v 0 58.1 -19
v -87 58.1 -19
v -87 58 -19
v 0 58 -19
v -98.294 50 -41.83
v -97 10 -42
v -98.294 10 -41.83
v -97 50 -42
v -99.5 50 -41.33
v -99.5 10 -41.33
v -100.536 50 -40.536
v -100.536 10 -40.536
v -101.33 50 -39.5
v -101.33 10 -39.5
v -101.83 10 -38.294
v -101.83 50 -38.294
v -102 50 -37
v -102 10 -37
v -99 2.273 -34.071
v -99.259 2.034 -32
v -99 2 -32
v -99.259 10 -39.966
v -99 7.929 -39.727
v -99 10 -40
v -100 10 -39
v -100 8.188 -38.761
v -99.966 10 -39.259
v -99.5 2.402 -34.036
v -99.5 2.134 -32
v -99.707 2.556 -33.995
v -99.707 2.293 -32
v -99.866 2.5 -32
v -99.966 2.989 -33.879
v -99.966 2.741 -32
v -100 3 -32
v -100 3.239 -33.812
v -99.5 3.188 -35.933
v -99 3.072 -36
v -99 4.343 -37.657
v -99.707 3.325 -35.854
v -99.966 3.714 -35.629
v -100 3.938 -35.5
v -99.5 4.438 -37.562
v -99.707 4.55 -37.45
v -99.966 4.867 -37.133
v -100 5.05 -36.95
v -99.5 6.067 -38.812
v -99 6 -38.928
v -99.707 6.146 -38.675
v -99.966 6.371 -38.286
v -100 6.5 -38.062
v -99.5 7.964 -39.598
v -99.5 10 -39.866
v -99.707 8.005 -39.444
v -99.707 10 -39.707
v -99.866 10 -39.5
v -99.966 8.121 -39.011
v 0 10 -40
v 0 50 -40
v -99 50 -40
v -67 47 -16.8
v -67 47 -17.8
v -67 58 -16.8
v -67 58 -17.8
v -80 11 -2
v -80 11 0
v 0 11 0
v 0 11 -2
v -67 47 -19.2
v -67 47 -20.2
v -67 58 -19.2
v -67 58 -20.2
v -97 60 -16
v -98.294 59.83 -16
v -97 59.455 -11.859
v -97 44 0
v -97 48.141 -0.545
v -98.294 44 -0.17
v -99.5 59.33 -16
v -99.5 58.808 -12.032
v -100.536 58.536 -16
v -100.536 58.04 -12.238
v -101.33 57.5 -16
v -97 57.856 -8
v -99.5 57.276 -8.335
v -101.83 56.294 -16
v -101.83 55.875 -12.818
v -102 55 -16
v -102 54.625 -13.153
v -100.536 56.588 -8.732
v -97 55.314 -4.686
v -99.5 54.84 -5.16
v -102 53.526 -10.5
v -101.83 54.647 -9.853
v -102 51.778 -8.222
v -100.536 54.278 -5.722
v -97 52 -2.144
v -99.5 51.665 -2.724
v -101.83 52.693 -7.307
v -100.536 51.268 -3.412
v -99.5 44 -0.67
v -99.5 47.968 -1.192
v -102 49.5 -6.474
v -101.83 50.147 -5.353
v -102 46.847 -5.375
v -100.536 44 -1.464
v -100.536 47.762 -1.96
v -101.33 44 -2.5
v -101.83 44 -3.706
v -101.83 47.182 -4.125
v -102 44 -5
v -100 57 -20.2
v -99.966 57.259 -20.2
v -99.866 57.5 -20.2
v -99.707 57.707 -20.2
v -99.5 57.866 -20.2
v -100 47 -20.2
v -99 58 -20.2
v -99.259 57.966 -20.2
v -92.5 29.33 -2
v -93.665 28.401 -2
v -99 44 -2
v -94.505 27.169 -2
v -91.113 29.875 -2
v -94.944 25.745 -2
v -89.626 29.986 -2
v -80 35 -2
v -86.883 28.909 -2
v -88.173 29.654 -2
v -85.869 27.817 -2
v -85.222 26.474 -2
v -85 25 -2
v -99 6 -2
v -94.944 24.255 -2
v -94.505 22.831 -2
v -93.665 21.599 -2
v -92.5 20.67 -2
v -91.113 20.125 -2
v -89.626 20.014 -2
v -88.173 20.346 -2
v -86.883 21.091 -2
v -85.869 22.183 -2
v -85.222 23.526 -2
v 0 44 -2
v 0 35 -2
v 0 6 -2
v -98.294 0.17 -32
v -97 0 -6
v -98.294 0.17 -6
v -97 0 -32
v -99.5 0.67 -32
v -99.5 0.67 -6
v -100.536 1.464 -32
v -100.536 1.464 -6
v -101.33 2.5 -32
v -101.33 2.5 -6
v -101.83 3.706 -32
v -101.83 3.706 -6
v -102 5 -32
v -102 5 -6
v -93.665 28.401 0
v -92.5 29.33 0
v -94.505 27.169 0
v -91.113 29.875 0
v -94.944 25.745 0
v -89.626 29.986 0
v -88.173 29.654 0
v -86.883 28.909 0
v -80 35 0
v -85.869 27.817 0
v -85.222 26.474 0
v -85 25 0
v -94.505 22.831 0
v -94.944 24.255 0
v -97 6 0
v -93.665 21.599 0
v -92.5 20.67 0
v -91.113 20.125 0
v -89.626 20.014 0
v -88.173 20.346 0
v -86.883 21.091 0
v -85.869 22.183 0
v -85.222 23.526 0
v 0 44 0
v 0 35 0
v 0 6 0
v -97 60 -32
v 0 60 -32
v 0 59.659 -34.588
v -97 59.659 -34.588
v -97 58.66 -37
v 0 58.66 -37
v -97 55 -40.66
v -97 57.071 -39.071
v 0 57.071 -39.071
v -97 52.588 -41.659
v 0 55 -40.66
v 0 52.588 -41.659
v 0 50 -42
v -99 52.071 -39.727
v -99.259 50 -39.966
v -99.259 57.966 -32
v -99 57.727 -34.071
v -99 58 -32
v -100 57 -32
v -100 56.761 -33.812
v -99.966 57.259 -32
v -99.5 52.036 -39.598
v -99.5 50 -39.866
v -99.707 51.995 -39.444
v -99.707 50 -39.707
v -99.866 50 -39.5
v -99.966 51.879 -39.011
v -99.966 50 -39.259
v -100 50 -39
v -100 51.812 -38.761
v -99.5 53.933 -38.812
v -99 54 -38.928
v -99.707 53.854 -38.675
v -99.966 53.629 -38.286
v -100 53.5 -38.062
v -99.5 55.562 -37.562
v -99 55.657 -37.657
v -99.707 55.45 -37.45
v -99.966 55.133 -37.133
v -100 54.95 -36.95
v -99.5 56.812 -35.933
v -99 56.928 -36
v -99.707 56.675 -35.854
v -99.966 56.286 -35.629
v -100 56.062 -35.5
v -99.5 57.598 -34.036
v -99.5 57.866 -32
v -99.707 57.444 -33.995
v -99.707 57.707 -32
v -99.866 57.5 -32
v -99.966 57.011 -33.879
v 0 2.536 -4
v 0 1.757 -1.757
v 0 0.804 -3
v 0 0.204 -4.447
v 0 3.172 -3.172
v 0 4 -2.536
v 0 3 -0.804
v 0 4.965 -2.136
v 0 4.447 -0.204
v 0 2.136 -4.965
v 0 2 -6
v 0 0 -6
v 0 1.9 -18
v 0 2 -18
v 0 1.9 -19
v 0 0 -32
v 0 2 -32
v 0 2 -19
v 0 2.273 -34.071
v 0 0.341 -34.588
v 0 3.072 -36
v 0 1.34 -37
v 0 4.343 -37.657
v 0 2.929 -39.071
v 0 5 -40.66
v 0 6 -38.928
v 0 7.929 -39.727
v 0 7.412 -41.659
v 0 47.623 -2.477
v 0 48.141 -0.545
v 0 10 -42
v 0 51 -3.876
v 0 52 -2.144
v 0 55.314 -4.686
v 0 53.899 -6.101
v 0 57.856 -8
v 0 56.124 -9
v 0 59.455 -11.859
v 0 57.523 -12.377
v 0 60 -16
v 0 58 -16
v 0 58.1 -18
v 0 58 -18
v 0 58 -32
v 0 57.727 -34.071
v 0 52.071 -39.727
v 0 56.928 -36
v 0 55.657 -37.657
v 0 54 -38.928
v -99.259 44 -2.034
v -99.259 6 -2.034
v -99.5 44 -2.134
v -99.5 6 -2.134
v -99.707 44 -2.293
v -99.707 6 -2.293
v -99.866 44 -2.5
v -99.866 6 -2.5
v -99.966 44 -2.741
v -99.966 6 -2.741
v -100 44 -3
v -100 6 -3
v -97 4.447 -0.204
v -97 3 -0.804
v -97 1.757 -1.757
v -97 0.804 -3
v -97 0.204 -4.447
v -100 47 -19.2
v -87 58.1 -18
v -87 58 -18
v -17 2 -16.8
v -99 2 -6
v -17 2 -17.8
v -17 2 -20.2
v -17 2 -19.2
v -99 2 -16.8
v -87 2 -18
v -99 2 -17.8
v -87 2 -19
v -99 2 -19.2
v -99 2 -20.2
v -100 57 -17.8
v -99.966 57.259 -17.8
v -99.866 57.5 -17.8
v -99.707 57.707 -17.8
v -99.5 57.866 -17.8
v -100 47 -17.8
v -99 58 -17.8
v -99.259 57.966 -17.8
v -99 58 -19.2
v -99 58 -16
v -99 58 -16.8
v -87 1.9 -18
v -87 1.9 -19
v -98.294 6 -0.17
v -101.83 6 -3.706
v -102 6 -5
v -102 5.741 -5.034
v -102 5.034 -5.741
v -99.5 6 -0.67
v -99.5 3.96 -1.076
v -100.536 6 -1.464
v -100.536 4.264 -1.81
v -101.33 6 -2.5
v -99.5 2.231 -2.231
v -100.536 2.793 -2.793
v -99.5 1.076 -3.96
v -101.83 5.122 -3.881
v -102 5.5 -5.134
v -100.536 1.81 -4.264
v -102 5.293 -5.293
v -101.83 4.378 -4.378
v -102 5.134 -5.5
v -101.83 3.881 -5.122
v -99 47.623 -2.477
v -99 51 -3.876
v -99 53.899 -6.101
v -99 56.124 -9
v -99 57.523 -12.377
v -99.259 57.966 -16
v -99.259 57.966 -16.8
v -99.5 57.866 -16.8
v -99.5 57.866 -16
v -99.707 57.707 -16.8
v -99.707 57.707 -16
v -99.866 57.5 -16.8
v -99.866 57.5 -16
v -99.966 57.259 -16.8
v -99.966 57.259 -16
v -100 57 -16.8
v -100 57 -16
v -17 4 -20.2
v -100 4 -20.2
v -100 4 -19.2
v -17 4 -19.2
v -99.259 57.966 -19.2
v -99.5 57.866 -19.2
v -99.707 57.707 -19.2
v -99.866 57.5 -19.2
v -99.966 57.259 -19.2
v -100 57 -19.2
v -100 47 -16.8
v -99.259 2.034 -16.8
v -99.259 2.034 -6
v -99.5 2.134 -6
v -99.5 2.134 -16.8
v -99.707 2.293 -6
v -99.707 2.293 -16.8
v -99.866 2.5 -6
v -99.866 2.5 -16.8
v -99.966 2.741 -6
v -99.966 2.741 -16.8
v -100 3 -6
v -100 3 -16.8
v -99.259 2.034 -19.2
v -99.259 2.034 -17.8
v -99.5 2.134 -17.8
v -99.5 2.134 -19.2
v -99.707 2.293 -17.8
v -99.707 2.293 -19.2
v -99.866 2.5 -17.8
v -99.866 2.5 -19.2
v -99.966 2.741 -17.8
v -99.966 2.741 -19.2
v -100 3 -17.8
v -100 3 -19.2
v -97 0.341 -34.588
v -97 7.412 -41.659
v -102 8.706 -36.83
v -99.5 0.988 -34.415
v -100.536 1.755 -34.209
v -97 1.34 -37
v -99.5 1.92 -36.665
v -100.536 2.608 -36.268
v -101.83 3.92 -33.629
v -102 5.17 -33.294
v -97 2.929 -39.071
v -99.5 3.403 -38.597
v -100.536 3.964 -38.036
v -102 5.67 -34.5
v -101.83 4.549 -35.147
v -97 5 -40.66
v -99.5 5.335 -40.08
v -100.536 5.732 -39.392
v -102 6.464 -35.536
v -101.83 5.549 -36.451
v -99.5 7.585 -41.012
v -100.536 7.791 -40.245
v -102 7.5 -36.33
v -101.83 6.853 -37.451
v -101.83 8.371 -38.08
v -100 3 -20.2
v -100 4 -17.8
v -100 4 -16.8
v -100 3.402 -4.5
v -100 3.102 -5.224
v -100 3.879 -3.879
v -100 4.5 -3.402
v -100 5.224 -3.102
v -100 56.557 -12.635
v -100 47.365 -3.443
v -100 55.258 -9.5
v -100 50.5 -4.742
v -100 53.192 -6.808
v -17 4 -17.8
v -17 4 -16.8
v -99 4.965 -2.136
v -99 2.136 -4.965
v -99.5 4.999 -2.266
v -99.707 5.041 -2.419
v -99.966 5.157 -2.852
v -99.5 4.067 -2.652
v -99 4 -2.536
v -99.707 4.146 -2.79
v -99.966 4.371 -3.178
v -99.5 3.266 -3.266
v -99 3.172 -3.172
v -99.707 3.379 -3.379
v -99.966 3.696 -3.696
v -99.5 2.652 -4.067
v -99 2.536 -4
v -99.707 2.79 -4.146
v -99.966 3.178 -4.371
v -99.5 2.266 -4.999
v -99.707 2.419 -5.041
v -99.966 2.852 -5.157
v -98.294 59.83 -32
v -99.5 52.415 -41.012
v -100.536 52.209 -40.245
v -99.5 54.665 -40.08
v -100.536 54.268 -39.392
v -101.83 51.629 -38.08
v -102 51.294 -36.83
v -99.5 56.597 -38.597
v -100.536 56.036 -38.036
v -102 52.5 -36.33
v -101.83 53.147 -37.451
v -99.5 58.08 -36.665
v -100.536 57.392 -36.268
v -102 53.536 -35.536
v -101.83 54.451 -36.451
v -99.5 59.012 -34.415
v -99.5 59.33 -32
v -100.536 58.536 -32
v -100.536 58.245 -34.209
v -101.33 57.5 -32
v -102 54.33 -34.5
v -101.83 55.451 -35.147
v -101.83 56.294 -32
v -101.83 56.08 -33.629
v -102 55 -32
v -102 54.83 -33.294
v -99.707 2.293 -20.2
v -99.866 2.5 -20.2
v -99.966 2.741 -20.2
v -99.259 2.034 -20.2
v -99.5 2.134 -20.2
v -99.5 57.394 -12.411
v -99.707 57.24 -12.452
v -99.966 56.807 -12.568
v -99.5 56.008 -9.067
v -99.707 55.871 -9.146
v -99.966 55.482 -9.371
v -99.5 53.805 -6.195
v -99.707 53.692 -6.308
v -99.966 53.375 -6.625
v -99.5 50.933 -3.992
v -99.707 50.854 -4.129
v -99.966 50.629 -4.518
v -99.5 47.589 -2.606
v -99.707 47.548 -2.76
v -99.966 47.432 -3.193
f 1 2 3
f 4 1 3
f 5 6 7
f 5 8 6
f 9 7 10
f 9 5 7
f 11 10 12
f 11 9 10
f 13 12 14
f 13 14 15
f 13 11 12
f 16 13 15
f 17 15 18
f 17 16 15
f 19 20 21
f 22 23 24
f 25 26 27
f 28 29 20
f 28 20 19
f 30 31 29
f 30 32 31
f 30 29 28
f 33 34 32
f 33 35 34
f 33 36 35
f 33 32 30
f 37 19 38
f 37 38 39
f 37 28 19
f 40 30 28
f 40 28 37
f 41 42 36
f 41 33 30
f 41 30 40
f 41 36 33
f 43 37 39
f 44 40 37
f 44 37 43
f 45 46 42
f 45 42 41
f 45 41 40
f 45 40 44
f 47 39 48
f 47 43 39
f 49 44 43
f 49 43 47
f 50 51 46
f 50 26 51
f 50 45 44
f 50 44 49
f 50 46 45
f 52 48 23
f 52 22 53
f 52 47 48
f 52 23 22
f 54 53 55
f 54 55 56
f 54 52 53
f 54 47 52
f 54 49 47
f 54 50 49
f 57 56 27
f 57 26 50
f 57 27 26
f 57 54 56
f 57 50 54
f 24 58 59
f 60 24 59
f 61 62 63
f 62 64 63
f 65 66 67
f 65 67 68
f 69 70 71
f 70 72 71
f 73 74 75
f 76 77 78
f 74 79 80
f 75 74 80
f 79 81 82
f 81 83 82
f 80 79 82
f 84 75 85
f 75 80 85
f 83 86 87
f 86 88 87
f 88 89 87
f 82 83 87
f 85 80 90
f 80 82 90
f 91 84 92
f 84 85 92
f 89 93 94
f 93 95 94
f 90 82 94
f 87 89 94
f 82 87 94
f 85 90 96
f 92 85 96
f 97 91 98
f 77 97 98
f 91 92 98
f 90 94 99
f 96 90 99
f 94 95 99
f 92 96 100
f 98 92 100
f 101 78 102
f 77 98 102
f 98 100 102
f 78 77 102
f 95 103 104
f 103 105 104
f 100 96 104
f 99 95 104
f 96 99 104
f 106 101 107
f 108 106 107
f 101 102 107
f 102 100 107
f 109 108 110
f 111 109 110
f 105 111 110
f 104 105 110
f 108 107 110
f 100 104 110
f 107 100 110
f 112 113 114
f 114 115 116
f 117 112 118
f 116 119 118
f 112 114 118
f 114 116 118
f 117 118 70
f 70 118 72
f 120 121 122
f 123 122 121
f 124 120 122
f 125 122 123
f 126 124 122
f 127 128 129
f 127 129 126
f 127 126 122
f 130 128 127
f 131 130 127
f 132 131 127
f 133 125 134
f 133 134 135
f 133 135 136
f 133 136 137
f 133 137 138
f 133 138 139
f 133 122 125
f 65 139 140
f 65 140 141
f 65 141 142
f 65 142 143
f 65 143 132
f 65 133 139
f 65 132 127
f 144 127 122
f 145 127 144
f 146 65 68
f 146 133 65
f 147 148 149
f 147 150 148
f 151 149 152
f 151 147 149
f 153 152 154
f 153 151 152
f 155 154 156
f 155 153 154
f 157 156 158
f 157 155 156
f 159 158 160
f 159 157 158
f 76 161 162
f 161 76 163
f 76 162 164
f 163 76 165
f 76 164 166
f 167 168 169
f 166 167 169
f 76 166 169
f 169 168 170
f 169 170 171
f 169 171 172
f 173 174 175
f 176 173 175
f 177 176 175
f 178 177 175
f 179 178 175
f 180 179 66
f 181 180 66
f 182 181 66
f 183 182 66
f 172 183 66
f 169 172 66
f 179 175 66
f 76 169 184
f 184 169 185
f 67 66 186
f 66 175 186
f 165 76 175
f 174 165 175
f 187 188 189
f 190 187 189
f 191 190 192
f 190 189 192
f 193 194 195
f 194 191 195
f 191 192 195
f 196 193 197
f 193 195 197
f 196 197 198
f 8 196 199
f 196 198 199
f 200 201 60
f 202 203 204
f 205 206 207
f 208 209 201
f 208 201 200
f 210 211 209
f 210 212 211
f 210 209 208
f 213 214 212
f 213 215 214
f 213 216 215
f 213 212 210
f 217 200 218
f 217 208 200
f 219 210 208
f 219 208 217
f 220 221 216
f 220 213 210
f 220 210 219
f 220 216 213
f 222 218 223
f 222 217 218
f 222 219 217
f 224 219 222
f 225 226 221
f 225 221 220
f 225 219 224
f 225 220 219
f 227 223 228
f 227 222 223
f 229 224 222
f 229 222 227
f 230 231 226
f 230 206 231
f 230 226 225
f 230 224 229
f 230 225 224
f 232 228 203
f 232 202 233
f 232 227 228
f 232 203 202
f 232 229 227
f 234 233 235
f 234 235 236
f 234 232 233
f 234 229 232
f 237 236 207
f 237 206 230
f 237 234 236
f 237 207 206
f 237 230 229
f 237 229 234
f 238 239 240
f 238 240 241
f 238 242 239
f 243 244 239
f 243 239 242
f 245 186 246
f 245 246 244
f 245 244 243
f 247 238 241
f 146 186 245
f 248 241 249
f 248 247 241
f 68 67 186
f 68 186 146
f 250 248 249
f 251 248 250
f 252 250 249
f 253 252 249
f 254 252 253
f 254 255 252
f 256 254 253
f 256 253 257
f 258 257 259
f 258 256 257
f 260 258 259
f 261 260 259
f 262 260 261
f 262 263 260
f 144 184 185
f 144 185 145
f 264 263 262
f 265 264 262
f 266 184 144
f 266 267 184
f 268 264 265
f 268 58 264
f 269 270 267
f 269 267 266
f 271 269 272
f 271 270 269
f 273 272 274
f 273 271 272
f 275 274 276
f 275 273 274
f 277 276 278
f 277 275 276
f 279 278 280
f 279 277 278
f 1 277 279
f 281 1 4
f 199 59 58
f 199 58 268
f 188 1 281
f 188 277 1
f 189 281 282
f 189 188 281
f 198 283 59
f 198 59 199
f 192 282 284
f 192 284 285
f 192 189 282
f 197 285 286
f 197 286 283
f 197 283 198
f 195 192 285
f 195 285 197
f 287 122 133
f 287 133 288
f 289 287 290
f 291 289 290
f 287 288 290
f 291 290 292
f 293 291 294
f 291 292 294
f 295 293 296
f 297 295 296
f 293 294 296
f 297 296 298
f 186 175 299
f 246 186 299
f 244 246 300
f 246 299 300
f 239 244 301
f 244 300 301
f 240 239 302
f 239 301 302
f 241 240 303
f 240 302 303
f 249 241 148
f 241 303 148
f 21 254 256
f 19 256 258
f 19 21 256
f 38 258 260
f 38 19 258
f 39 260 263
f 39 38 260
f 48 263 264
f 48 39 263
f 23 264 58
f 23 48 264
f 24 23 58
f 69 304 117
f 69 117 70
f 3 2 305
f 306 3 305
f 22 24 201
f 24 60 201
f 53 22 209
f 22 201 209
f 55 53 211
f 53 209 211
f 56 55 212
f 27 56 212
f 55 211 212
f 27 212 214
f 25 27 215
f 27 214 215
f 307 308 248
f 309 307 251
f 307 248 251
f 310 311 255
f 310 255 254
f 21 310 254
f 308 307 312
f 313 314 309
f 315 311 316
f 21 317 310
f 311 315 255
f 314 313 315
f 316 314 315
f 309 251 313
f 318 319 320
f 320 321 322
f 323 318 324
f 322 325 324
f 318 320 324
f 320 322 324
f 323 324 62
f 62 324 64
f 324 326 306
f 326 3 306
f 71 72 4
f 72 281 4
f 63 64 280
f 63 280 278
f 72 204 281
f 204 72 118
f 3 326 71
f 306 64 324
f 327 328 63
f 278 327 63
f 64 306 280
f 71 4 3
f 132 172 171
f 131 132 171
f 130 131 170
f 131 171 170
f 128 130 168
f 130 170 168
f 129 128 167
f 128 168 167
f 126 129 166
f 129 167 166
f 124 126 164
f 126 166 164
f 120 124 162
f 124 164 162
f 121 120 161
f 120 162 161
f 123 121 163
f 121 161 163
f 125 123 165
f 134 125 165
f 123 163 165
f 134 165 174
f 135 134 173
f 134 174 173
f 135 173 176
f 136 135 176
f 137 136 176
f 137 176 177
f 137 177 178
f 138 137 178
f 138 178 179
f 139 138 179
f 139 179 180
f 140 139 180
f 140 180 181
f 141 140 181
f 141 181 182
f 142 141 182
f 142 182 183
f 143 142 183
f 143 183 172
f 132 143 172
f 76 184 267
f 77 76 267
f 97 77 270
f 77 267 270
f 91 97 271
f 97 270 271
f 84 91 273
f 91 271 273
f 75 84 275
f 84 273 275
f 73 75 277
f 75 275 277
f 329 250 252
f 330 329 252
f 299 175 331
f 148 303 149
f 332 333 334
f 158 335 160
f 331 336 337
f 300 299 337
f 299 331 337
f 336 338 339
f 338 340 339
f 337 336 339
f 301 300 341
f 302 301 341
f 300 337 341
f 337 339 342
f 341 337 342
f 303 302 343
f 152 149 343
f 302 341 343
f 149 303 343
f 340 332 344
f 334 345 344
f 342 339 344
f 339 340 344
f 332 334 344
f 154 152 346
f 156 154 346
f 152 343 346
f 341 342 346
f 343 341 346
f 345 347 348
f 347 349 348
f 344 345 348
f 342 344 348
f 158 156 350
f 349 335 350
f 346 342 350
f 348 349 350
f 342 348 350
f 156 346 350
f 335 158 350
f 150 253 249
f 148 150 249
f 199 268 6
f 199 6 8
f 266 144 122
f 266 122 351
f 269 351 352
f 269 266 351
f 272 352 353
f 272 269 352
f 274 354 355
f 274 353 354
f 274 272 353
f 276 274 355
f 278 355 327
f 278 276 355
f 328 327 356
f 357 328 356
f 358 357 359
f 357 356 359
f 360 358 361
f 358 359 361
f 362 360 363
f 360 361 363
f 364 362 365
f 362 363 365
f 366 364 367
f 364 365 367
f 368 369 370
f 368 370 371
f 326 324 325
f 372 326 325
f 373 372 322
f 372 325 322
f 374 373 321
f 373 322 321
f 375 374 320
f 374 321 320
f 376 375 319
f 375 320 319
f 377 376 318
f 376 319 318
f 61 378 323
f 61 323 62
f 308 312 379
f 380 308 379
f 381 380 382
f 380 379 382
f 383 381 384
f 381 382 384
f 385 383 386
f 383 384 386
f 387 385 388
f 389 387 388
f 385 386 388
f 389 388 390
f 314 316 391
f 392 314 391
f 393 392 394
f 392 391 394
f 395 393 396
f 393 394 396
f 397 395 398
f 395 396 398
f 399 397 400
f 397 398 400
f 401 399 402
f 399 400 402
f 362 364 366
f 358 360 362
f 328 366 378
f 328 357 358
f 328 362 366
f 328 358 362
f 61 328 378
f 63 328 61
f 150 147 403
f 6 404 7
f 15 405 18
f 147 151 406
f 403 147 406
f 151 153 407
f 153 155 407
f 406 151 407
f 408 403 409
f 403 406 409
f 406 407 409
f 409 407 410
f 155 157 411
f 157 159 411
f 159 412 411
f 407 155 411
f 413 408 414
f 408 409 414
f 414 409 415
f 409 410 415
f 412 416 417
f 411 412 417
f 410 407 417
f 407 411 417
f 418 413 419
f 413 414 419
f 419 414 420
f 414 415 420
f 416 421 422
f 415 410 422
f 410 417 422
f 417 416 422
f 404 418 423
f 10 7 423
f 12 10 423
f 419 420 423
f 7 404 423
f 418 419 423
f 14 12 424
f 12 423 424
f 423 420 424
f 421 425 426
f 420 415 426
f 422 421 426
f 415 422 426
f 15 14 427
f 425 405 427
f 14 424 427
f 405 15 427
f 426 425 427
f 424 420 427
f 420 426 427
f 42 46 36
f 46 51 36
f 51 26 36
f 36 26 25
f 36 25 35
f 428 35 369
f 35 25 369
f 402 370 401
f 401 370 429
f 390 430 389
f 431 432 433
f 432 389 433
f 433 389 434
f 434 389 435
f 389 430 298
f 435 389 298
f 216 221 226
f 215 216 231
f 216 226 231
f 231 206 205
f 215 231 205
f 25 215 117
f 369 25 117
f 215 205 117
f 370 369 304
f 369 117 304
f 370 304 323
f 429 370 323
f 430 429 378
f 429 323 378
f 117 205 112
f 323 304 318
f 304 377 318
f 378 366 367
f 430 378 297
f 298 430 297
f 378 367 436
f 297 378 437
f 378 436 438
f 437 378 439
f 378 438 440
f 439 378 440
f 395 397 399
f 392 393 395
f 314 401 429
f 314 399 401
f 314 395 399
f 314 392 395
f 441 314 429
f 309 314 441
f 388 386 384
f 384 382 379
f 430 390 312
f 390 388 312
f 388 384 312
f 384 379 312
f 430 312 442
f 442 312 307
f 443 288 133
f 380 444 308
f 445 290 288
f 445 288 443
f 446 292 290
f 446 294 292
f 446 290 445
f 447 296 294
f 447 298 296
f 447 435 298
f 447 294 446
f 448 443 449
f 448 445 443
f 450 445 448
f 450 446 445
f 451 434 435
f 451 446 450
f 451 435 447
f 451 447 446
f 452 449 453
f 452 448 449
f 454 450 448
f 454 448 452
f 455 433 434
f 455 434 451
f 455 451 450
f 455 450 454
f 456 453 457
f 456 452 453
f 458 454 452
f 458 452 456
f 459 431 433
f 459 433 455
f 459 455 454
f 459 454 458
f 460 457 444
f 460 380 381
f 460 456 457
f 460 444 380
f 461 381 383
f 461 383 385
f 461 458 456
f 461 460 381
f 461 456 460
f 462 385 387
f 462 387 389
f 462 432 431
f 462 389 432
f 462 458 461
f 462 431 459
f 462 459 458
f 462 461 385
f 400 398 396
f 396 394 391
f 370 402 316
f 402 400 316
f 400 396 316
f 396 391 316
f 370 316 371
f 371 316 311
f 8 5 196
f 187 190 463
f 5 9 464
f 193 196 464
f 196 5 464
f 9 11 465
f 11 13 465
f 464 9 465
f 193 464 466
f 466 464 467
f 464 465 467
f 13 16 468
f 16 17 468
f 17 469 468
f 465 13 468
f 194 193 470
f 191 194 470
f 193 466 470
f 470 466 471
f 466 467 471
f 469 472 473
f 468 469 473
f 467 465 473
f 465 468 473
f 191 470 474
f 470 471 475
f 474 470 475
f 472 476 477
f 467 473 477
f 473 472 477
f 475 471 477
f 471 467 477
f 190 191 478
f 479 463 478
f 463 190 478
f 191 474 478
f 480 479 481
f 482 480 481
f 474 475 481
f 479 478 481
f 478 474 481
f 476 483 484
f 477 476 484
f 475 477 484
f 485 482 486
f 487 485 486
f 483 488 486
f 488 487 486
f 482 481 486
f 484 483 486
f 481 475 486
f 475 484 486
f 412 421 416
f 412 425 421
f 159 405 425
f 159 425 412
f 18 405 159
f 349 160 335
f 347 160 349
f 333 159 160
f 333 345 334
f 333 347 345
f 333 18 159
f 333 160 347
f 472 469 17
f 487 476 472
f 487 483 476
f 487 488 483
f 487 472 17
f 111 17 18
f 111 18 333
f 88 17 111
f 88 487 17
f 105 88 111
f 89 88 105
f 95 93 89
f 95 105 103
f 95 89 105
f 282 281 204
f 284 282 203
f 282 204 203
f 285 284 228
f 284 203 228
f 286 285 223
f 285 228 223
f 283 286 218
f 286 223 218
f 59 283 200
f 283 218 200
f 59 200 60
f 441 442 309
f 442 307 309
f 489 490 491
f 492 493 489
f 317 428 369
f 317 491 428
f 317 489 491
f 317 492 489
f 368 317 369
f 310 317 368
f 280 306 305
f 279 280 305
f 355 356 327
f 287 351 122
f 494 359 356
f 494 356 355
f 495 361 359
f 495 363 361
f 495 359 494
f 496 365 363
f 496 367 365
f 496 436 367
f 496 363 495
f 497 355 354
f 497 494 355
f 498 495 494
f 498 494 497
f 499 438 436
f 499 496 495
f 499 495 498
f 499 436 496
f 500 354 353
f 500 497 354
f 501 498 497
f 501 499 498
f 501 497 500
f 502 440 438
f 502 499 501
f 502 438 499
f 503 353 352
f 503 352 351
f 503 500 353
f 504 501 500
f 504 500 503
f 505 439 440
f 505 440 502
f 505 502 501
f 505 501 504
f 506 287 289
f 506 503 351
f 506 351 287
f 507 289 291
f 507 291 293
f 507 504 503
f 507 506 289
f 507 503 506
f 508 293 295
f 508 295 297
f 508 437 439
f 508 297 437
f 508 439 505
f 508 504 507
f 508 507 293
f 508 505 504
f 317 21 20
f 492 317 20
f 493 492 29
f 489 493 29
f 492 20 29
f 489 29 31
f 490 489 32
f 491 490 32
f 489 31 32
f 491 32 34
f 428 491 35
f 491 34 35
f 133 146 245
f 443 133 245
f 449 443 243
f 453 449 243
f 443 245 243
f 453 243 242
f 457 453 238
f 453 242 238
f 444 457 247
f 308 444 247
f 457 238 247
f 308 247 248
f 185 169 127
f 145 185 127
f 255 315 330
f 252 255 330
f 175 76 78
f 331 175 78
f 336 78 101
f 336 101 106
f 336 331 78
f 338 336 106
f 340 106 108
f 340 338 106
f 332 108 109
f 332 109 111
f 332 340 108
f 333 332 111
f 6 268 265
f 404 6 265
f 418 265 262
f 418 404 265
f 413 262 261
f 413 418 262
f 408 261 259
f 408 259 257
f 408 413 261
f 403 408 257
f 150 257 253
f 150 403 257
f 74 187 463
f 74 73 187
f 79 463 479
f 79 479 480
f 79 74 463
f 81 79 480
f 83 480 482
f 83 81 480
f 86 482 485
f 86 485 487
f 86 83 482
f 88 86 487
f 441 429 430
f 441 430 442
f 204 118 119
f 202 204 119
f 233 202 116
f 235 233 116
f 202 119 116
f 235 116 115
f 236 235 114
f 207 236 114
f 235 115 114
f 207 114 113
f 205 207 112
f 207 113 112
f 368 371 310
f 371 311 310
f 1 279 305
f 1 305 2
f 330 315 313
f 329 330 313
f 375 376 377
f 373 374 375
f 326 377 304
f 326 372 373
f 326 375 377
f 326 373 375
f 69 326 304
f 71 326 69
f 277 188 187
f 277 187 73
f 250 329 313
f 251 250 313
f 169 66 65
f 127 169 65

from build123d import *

# Parameters (mm, degrees)
SKETCH_1_W                  = 1
SKETCH_1_H                  = 1.9
SKETCH_1_W_2                = 2
SKETCH_1_H_2                = 60
EXTRUDE_1_DEPTH             = 90
SKETCH_2_W                  = 2
SKETCH_2_H                  = 24
CUT_EXTRUDE_1_DEPTH         = 117.034477635
SKETCH_4_W                  = 1
SKETCH_4_H                  = 0.1
EXTRUDE_2_DEPTH             = 3
SKETCH_5_W                  = 2
SKETCH_5_H                  = 24
EXTRUDE_3_DEPTH             = 10
SKETCH_6_W                  = 42
SKETCH_6_H                  = 60
EXTRUDE_4_DEPTH             = 2
EXTRUDE_5_REACH             = 122.702
SKETCH_8_W                  = 10
SKETCH_8_H                  = 2
CUT_EXTRUDE_2_REACH         = 127.571
SKETCH_7_R                  = 5
FILLET_1_R                  = 14
FILLET_2_R                  = 16
FILLET_4_R                  = 8
FILLET_5_R                  = 10
FILLET_6_R                  = 4
FILLET_7_R                  = 6
FILLET_8_R                  = 5
FILLET_9_R                  = 1
EXTRUDE_6_REACH             = 115.723
SKETCH_10_W                 = 1
SKETCH_10_H                 = 1
EXTRUDE_6_DIRECTION_2_DEPTH = 20
SKETCH_11_W                 = 1
SKETCH_11_H                 = 1
EXTRUDE_7_DEPTH             = 50
SKETCH_12_W                 = 33
SKETCH_12_H                 = 1
EXTRUDE_8_DEPTH             = 10
SKETCH_13_W                 = 83
SKETCH_13_H                 = 1
EXTRUDE_9_DEPTH             = 1


with BuildPart() as part:
    # Эскиз1 → Бобышка-Вытянуть1 (new body)
    with BuildSketch(Plane(origin=(0, 0, 0), x_dir=(0, 0, -1), z_dir=(1, 0, 0))):
        Polygon((18, 60), (2, 60), (2, 58), (18, 58), (18, 58.1), align=None)
        with Locations((18.5, 59.05)):
            Rectangle(SKETCH_1_W, SKETCH_1_H)
        Polygon((40, 60), (19, 60), (19, 58.1), (19, 58), (40, 58), align=None)
        with Locations((1, 30)):
            Rectangle(SKETCH_1_W_2, SKETCH_1_H_2)
        Polygon((40, 2), (40, 0), (42, 0), (42, 60), (40, 60), (40, 58), align=None)
        Polygon((19, 1.9), (19, 0), (40, 0), (40, 2), (19, 2), align=None)
        with Locations((18.5, 0.95)):
            Rectangle(SKETCH_1_W, SKETCH_1_H)
        Polygon((2, 2), (2, 0), (18, 0), (18, 1.9), (18, 2), align=None)
    extrude(amount=-EXTRUDE_1_DEPTH)

    # Эскиз2 → Вырез-Вытянуть1 (cut, through all)
    with BuildSketch(Plane(origin=(0, 0, 0), x_dir=(0, 0, -1), z_dir=(1, 0, 0))):
        with Locations((1, 23)):
            Rectangle(SKETCH_2_W, SKETCH_2_H)
    extrude(amount=-CUT_EXTRUDE_1_DEPTH, mode=Mode.SUBTRACT)

    # Эскиз4 → Бобышка-Вытянуть2 (add)
    with BuildSketch(Plane.ZY.offset(90)):
        with Locations((-18.5, 58.05)):
            Rectangle(SKETCH_4_W, SKETCH_4_H)
        with Locations((-18.5, 1.95)):
            Rectangle(SKETCH_4_W, SKETCH_4_H)
    extrude(amount=-EXTRUDE_2_DEPTH)

    # Эскиз5 → Бобышка-Вытянуть3 (add)
    with BuildSketch(Plane.ZY.offset(90)):
        Polygon((0, 11), (-2, 11), (-2, 2), (-40, 2), (-40, 58), (-2, 58), (-2, 35), (0, 35), (0, 60), (-42, 60), (-42, 0), (0, 0), align=None)
        with Locations((-1, 23)):
            Rectangle(SKETCH_5_W, SKETCH_5_H)
    extrude(amount=EXTRUDE_3_DEPTH)

    # Эскиз6 → Бобышка-Вытянуть4 (add)
    with BuildSketch(Plane.ZY.offset(100)):
        with Locations((-21, 30)):
            Rectangle(SKETCH_6_W, SKETCH_6_H)
    extrude(amount=EXTRUDE_4_DEPTH)

    # Эскиз8 → Бобышка-Вытянуть5 (add, up to next)
    with BuildSketch(Plane(origin=(0, 11, 0), x_dir=(1, 0, 0), z_dir=(0, 1, 0)), mode=Mode.PRIVATE) as extrude_5_sk1:
        with Locations((-85, 1)):
            Rectangle(SKETCH_8_W, SKETCH_8_H)
    extrude_5_tool1 = extrude(extrude_5_sk1.sketch, amount=EXTRUDE_5_REACH, mode=Mode.PRIVATE) - part.part
    add(extrude_5_tool1.solids().sort_by_distance((-85, 11, -1))[0])

    # Эскиз7 → Вырез-Вытянуть2 (cut, up to next)
    with BuildSketch(Plane.XY, mode=Mode.PRIVATE) as cut_extrude_2_sk1:
        with Locations((-90, 25)):
            Circle(SKETCH_7_R)
    cut_extrude_2_tool1 = extrude(cut_extrude_2_sk1.sketch, amount=-CUT_EXTRUDE_2_REACH, mode=Mode.PRIVATE) & part.part
    add(cut_extrude_2_tool1.solids().sort_by_distance((-90, 25, 0))[0], mode=Mode.SUBTRACT)

    # Скругление1
    fillet_1_edges = [part.edges().sort_by_distance(p)[0] for p in [
        (-50, 58, -2),
    ]]
    fillet(fillet_1_edges, radius=FILLET_1_R)

    # Скругление2
    fillet_2_edges = [part.edges().sort_by_distance(p)[0] for p in [
        (-51, 60, 0),
    ]]
    fillet(fillet_2_edges, radius=FILLET_2_R)

    # Скругление4
    fillet_4_edges = [part.edges().sort_by_distance(p)[0] for p in [
        (-50, 2, -40),
        (-50, 58, -40),
    ]]
    fillet(fillet_4_edges, radius=FILLET_4_R)

    # Скругление5
    fillet_5_edges = [part.edges().sort_by_distance(p)[0] for p in [
        (-51, 60, -42),
        (-51, 0, -42),
    ]]
    fillet(fillet_5_edges, radius=FILLET_5_R)

    # Скругление6
    fillet_6_edges = [part.edges().sort_by_distance(p)[0] for p in [
        (-50, 2, -2),
    ]]
    fillet(fillet_6_edges, radius=FILLET_6_R)

    # Скругление7
    fillet_7_edges = [part.edges().sort_by_distance(p)[0] for p in [
        (-51, 0, 0),
    ]]
    fillet(fillet_7_edges, radius=FILLET_7_R)

    # Скругление8
    fillet_8_edges = [part.edges().sort_by_distance(p)[0] for p in [
        (-102, 60, -24),
        (-102, 55.313708499, -4.686291501),
        (-102, 0, -19),
        (-102, 30, -42),
        (-102, 57.071067812, -39.071067812),
        (-102, 2.928932188, -39.071067812),
        (-102, 25, 0),
        (-102, 1.757359313, -1.757359313),
    ]]
    fillet(fillet_8_edges, radius=FILLET_8_R)

    # Скругление9
    fillet_9_edges = [part.edges().sort_by_distance(p)[0] for p in [
        (-100, 25, -2),
        (-100, 53.899494937, -6.100505063),
        (-100, 30, -40),
        (-100, 58, -24),
        (-100, 55.656854249, -37.656854249),
        (-100, 4.343145751, -37.656854249),
        (-100, 2, -19),
        (-100, 3.171572875, -3.171572875),
    ]]
    fillet(fillet_9_edges, radius=FILLET_9_R)

    # Эскиз10 → Бобышка-Вытянуть6 (add, up to next)
    with BuildSketch(Plane(origin=(-87, 0, 0), x_dir=(0, 0, -1), z_dir=(1, 0, 0)), mode=Mode.PRIVATE) as extrude_6_sk1:
        with Locations((17.3, 57.5)):
            Rectangle(SKETCH_10_W, SKETCH_10_H)
    extrude_6_tool1 = extrude(extrude_6_sk1.sketch, amount=-EXTRUDE_6_REACH, mode=Mode.PRIVATE) - part.part
    # Эскиз10 → Бобышка-Вытянуть6 (add, up to next)
    with BuildSketch(Plane(origin=(-87, 0, 0), x_dir=(0, 0, -1), z_dir=(1, 0, 0)), mode=Mode.PRIVATE) as extrude_6_sk2:
        with Locations((19.7, 57.5)):
            Rectangle(SKETCH_10_W, SKETCH_10_H)
    extrude_6_tool2 = extrude(extrude_6_sk2.sketch, amount=-EXTRUDE_6_REACH, mode=Mode.PRIVATE) - part.part
    extrude_6_1 = extrude_6_tool1.solids().sort_by_distance((-87, 57.5, -17.3))[0]
    add(extrude_6_1)
    extrude_6_2 = extrude_6_tool2.solids().sort_by_distance((-87, 57.5, -19.7))[0]
    add(extrude_6_2)
    extrude_6 = extrude_6_1 + extrude_6_2  # Бобышка-Вытянуть6 as one shape, for the pattern or mirror that repeats it

    # Эскиз10 → Бобышка-Вытянуть6 direction 2 (add)
    with BuildSketch(Plane(origin=(-87, 0, 0), x_dir=(0, 0, -1), z_dir=(1, 0, 0))):
        with Locations((17.3, 57.5)):
            Rectangle(SKETCH_10_W, SKETCH_10_H)
        with Locations((19.7, 57.5)):
            Rectangle(SKETCH_10_W, SKETCH_10_H)
    extrude_6_direction_2 = extrude(amount=EXTRUDE_6_DIRECTION_2_DEPTH)

    # Зеркальное отражение1: Бобышка-Вытянуть6, Бобышка-Вытянуть6 direction 2 across plane
    add(extrude_6.mirror(Plane(origin=(0, 30, 0), x_dir=(0, 0, 1), z_dir=(0, -1, 0))))
    add(extrude_6_direction_2.mirror(Plane(origin=(0, 30, 0), x_dir=(0, 0, 1), z_dir=(0, -1, 0))))

    # Эскиз11 → Бобышка-Вытянуть7 (add)
    with BuildSketch(Plane(origin=(-67, 0, 0), x_dir=(0, 0, -1), z_dir=(1, 0, 0))):
        with Locations((19.7, 2.5)):
            Rectangle(SKETCH_11_W, SKETCH_11_H)
        with Locations((17.3, 2.5)):
            Rectangle(SKETCH_11_W, SKETCH_11_H)
    extrude(amount=EXTRUDE_7_DEPTH)

    # Эскиз12 → Бобышка-Вытянуть8 (add)
    with BuildSketch(Plane.XZ.offset(-57)):
        with Locations((-83.5, -17.3)):
            Rectangle(SKETCH_12_W, SKETCH_12_H)
        with Locations((-83.5, -19.7)):
            Rectangle(SKETCH_12_W, SKETCH_12_H)
    extrude(amount=EXTRUDE_8_DEPTH)

    # Эскиз13 → Бобышка-Вытянуть9 (add)
    with BuildSketch(Plane(origin=(0, 3, 0), x_dir=(1, 0, 0), z_dir=(0, 1, 0))):
        with Locations((-58.5, 19.7)):
            Rectangle(SKETCH_13_W, SKETCH_13_H)
        with Locations((-58.5, 17.3)):
            Rectangle(SKETCH_13_W, SKETCH_13_H)
    extrude(amount=EXTRUDE_9_DEPTH)


solid = part.part
